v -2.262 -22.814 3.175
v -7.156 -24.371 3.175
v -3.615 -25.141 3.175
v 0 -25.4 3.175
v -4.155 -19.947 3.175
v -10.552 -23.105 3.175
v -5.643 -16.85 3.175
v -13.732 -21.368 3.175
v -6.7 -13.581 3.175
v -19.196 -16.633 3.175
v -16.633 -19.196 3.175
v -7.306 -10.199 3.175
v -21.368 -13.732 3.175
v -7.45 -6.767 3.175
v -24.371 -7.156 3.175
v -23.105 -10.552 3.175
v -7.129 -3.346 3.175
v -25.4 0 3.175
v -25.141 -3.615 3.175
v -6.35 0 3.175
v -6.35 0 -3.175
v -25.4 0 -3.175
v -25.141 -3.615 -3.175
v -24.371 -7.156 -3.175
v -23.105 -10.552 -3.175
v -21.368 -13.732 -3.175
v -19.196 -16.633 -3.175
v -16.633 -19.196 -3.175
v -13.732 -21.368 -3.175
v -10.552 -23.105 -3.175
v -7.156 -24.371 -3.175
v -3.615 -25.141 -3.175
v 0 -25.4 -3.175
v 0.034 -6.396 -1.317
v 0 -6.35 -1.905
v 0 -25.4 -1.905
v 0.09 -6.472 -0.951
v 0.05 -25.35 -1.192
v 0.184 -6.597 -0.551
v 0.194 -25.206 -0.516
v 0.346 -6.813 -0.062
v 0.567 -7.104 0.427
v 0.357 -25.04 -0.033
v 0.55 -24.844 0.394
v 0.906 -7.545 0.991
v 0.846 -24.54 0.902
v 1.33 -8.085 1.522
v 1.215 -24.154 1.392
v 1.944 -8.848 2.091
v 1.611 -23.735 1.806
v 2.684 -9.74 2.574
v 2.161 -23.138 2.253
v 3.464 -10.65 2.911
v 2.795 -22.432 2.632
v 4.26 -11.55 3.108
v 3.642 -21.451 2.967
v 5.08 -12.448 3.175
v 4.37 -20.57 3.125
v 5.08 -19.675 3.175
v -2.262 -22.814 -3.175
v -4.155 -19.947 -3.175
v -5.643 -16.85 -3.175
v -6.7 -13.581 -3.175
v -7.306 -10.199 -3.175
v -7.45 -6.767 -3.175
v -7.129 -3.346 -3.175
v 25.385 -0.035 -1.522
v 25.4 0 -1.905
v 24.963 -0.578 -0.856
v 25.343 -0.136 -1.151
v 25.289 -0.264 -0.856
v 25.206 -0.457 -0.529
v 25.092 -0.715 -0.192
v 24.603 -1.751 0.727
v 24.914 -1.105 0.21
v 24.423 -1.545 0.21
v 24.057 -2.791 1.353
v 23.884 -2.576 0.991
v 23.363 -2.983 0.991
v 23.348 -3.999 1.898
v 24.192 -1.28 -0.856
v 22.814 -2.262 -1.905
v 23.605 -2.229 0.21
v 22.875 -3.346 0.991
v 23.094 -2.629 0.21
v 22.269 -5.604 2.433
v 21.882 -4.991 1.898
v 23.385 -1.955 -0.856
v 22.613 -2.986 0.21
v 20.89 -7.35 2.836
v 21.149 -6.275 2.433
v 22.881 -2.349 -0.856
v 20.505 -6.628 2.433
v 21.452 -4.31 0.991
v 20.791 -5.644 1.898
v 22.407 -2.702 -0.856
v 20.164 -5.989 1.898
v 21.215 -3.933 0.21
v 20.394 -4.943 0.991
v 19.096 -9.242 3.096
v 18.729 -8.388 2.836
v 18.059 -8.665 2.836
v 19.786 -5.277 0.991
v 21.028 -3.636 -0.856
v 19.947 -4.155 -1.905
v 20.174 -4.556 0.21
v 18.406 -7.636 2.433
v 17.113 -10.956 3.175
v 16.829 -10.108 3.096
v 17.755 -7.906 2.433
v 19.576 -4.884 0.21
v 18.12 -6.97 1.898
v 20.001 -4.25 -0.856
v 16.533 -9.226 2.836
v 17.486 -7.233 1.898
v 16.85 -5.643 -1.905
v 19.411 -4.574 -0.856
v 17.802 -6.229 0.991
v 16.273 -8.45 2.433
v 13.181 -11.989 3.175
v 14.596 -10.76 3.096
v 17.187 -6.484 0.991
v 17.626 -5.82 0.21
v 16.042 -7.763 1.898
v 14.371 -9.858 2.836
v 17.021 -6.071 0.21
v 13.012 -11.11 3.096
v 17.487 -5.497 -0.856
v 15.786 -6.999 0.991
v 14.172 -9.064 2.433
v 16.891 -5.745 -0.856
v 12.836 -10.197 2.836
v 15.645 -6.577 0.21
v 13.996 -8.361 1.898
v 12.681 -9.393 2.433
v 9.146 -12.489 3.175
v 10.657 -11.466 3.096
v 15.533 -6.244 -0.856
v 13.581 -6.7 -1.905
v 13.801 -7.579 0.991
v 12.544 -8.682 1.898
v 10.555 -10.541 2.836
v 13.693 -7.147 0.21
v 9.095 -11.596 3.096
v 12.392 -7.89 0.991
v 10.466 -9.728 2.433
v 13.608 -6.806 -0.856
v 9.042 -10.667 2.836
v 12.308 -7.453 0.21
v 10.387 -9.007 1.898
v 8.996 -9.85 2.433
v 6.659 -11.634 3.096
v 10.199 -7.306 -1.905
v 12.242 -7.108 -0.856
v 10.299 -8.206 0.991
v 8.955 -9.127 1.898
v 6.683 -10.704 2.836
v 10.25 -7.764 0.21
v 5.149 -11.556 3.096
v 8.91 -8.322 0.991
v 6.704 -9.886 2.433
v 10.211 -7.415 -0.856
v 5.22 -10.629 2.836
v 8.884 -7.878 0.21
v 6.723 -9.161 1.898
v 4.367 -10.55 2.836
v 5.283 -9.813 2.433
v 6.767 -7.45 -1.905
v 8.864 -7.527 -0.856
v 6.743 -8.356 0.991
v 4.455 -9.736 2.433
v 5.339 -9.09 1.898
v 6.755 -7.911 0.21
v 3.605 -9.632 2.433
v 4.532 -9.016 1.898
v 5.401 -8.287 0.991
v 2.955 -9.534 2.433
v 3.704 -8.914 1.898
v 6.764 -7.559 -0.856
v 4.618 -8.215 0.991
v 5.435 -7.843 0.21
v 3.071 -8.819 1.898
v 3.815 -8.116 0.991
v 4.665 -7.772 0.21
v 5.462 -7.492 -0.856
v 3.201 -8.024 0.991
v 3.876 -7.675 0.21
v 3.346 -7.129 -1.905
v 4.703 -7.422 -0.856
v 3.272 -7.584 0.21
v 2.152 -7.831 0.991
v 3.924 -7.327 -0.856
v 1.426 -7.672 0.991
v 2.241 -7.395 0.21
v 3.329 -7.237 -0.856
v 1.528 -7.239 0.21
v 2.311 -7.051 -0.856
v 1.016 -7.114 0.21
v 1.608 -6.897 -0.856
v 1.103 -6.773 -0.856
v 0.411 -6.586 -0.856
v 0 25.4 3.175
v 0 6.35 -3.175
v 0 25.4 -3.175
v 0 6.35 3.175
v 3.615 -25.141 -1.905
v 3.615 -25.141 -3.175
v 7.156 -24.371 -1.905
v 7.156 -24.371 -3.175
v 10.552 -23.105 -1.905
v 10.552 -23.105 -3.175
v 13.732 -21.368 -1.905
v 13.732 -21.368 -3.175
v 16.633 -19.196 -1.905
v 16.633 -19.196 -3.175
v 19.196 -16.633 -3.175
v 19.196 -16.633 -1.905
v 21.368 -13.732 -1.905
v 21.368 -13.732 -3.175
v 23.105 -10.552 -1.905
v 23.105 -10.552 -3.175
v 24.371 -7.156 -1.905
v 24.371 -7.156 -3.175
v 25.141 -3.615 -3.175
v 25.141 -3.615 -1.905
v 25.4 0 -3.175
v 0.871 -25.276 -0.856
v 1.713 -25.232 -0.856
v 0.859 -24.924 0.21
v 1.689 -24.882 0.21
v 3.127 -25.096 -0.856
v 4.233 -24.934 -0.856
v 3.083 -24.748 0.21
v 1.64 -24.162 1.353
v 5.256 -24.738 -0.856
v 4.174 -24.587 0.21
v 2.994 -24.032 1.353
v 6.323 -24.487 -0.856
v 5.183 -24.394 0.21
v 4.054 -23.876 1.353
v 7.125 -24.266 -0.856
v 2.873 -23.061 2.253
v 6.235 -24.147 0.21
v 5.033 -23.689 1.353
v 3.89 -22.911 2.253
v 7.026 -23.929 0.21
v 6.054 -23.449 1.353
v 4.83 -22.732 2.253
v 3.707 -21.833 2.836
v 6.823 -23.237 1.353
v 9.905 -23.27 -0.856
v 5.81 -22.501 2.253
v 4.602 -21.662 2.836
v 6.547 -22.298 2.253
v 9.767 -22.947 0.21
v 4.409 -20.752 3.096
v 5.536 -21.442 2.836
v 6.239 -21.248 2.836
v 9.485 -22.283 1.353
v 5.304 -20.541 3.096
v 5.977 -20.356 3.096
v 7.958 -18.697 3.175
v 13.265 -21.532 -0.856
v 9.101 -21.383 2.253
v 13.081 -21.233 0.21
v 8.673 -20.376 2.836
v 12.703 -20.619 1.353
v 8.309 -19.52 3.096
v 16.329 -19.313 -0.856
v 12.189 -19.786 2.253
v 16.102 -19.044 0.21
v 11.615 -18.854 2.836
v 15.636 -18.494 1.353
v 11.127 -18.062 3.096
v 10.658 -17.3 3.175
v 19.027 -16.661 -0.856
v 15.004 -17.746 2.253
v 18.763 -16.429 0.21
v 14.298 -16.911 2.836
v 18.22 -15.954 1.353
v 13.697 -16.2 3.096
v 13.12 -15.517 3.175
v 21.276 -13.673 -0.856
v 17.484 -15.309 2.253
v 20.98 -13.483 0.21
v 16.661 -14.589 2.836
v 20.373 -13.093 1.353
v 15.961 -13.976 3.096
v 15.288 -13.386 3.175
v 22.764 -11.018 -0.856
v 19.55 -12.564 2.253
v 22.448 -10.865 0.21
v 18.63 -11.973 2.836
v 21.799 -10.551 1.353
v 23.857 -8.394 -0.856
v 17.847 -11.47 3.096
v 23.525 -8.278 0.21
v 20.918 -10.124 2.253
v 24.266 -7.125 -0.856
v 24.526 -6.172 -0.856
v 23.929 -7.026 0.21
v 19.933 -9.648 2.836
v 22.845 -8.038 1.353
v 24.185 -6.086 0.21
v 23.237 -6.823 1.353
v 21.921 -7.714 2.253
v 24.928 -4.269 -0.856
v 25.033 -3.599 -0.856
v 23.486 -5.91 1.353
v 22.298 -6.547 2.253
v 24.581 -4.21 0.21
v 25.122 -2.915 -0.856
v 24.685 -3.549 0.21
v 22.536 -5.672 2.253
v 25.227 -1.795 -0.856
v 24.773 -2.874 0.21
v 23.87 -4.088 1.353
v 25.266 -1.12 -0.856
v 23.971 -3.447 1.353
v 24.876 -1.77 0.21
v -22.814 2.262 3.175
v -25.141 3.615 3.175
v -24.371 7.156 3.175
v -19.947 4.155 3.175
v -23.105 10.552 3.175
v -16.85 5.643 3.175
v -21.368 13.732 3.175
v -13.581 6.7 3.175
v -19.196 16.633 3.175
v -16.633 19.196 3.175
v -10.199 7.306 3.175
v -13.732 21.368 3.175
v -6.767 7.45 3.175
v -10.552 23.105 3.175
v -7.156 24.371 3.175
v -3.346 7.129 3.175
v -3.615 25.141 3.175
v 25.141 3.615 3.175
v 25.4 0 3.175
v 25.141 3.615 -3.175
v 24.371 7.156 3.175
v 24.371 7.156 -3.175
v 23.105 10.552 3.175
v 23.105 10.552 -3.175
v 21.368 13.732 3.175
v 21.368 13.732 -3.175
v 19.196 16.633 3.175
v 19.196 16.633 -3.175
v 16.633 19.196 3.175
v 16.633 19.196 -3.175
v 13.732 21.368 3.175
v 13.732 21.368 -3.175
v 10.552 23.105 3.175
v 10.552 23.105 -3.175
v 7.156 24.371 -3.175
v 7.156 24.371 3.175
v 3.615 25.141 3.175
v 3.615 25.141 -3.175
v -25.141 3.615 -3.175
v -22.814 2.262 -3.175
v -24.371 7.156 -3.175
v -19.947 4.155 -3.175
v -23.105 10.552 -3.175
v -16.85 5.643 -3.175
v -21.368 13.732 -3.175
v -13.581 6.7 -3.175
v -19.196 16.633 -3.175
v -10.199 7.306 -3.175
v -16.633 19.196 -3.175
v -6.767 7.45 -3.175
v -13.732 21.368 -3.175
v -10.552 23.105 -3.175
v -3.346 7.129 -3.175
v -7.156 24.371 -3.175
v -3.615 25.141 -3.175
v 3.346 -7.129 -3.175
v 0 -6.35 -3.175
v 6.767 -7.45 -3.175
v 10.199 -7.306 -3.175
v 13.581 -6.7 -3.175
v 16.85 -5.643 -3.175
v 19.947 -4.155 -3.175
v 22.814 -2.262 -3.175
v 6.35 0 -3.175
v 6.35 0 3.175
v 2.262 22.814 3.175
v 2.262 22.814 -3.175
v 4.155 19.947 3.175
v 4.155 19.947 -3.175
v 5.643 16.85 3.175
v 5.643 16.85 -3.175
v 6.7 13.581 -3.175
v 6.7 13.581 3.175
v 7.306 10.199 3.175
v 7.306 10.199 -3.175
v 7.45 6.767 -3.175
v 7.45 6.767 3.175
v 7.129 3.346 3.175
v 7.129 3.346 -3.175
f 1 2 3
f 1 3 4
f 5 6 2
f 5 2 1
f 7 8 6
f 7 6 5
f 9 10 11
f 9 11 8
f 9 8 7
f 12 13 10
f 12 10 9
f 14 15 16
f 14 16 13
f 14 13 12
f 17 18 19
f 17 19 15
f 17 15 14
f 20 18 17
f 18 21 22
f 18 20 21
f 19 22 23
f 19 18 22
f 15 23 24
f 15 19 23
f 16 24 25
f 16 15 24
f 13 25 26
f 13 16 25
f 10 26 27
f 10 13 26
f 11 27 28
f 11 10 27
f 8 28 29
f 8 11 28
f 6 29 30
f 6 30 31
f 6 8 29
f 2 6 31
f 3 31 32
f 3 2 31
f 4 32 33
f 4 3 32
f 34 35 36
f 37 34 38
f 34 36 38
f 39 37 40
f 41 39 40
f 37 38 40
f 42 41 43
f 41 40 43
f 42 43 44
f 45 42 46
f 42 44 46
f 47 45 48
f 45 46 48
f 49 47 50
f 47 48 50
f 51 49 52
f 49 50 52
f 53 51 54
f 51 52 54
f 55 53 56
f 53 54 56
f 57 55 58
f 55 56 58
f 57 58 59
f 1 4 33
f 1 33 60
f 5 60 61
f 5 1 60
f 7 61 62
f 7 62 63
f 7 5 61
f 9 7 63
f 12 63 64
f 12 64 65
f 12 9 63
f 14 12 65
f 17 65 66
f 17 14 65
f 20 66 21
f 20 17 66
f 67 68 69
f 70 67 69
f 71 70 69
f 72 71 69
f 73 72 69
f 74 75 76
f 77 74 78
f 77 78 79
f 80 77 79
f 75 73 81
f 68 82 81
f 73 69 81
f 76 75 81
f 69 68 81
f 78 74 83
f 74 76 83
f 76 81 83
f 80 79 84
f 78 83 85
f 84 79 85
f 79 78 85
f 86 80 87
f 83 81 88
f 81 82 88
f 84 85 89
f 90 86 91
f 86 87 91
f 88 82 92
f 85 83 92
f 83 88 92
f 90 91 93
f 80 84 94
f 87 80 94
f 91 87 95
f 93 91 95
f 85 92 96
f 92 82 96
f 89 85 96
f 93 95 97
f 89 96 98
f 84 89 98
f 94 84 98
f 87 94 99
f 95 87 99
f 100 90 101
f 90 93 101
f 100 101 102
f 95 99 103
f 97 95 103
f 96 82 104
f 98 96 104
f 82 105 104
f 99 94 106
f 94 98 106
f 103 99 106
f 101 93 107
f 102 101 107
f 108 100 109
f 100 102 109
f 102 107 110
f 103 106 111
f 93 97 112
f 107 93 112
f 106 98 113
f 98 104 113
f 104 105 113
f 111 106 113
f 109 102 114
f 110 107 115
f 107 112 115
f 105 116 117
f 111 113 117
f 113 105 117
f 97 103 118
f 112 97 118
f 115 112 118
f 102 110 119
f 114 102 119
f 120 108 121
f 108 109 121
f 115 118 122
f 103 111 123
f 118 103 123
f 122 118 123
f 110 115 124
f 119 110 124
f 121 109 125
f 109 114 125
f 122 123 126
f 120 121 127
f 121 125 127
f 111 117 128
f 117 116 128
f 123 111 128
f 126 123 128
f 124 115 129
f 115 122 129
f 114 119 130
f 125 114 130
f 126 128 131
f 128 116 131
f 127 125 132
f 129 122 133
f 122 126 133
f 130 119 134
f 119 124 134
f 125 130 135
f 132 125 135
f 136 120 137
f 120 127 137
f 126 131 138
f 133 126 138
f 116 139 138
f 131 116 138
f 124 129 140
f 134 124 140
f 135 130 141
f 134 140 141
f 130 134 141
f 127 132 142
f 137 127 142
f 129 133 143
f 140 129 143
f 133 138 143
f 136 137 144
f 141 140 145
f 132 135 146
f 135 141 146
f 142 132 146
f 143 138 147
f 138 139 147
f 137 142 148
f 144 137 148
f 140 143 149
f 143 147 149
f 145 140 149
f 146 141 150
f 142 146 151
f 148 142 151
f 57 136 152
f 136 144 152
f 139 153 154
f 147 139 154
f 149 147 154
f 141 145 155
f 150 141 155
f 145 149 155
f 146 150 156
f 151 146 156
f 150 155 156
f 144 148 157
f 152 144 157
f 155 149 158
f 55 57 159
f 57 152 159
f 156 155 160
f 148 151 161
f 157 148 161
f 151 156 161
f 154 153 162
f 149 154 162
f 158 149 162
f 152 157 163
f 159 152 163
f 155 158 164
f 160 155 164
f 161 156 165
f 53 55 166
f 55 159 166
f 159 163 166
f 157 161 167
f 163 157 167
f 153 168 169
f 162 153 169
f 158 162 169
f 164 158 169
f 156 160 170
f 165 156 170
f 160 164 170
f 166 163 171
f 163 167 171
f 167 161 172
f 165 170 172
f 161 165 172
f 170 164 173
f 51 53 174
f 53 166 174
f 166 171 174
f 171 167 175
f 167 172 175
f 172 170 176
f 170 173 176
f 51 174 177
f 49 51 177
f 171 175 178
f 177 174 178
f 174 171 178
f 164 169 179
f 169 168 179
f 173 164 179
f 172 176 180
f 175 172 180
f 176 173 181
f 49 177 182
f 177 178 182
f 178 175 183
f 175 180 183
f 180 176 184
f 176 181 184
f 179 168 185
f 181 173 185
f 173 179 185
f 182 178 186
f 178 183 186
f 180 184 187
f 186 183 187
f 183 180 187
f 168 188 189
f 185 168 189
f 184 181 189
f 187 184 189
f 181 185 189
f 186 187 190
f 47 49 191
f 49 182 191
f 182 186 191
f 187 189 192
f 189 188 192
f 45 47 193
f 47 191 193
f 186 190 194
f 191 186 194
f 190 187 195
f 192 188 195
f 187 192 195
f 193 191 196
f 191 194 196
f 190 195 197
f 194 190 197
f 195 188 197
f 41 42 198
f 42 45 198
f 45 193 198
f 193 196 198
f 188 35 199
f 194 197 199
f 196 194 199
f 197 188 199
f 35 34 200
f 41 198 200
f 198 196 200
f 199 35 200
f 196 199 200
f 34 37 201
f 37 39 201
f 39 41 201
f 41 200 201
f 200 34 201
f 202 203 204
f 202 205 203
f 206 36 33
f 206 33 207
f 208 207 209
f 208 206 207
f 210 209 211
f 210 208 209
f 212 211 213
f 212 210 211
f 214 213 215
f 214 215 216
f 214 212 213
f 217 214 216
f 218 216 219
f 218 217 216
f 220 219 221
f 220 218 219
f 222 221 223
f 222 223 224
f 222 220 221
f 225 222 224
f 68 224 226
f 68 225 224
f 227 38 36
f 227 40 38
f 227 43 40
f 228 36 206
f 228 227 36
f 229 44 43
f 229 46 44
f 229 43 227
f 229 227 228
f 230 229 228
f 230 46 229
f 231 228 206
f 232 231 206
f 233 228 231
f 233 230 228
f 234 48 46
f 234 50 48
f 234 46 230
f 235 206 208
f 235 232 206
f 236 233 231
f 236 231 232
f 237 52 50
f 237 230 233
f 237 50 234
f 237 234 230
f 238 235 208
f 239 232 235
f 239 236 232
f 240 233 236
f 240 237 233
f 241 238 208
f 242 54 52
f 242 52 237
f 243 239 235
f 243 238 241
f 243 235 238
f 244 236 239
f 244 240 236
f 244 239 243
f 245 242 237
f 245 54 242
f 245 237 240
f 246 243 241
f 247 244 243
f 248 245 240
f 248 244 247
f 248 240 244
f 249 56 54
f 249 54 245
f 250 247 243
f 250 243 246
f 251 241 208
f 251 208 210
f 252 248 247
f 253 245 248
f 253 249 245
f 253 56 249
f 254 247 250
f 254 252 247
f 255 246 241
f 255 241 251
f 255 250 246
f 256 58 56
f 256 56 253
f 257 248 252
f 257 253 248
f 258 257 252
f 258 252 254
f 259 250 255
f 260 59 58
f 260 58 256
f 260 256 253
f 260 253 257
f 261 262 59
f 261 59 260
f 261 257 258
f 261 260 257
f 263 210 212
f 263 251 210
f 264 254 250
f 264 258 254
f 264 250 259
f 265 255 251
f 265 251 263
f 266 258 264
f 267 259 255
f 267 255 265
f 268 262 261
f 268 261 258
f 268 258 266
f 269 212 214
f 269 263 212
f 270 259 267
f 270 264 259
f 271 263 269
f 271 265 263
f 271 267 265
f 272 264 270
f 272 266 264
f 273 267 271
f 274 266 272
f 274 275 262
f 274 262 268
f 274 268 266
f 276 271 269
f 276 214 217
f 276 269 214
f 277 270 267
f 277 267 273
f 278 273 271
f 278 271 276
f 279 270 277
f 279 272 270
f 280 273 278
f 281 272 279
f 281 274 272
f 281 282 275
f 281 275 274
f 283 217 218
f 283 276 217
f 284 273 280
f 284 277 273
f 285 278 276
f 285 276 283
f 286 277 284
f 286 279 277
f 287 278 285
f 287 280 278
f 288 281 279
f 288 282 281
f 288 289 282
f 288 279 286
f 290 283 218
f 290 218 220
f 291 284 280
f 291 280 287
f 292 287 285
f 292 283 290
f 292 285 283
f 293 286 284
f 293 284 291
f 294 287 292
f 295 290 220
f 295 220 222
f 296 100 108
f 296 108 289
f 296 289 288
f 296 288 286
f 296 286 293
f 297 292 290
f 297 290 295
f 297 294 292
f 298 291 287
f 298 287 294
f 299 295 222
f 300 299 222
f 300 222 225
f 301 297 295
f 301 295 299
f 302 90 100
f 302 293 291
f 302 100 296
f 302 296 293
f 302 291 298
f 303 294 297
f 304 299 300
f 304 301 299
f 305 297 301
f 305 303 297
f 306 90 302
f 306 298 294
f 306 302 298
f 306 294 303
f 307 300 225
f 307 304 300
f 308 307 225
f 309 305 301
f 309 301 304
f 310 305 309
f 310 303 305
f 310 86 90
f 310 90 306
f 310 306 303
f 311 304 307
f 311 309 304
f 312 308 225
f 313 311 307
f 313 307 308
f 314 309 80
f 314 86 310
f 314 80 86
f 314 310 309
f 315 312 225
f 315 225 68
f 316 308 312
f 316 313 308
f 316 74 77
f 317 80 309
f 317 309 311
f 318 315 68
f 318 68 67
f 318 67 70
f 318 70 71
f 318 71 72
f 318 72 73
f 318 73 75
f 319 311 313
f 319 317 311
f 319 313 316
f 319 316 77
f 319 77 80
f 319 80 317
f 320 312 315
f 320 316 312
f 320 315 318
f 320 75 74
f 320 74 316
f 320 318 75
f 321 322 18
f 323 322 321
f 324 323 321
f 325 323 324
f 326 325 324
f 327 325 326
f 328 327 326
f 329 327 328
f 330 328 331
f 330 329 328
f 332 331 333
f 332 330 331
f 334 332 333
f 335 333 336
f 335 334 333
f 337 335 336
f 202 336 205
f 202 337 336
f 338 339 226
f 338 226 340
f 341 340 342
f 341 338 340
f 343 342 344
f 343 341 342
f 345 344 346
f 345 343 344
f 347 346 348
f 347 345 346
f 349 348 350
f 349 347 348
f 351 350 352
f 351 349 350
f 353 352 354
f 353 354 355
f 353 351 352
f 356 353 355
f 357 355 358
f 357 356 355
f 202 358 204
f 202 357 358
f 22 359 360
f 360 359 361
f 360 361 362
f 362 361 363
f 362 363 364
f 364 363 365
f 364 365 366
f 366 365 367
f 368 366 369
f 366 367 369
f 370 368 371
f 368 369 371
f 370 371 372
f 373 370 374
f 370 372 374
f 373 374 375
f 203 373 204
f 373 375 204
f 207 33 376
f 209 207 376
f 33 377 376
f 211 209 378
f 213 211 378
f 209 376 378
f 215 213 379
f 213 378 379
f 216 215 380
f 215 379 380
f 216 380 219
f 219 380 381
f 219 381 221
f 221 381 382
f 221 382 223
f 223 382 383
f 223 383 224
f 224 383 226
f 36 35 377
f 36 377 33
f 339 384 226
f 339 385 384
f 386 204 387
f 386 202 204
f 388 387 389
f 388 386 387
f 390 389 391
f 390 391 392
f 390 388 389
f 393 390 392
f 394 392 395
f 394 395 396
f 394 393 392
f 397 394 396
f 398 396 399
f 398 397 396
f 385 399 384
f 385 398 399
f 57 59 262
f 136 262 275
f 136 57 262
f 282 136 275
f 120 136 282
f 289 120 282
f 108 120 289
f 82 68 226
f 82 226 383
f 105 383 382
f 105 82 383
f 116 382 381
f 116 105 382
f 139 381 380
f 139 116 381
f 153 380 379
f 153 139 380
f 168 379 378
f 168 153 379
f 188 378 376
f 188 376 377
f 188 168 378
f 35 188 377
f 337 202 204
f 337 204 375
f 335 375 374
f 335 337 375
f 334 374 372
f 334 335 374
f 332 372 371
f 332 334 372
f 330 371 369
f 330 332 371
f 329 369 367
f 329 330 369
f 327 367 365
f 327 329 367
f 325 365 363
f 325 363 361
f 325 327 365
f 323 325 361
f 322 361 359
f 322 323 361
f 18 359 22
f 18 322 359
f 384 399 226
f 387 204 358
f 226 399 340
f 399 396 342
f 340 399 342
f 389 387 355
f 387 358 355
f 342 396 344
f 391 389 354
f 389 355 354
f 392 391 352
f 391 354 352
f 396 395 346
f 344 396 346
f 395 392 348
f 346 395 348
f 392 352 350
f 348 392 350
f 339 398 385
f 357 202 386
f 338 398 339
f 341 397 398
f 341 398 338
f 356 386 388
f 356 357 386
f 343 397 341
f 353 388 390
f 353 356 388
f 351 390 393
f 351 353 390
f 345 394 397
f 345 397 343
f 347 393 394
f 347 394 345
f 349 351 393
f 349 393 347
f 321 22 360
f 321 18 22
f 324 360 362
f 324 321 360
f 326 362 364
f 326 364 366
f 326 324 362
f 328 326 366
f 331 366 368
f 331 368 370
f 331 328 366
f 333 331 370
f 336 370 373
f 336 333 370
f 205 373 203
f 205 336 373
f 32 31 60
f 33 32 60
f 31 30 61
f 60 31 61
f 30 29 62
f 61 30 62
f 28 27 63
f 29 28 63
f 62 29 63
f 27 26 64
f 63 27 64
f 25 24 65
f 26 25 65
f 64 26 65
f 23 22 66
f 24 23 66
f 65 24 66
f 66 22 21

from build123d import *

# Parameters (mm, degrees)
F1_DEPTH = 3.175
F2_R     = 5.08


with BuildPart() as f1:
    # F0 (on Top) → F1 (new body, symmetric)
    with BuildSketch(Plane.XY):
        with BuildLine():
            Line((6.35, 0), (25.4, 0))
            ThreePointArc((25.4, 0), (17.9605122421, 17.9605122421), (0, 25.4))
            ThreePointArc((0, 25.4), (6.6998154897, 13.5812038724), (6.35, 0))
        make_face()
    extrude(amount=F1_DEPTH, both=True)


with BuildPart() as f1b:
    # F0 (on Top) → F1, piece 2 (new body, symmetric)
    with BuildSketch(Plane.XY):
        with BuildLine():
            Line((0, 6.35), (0, 25.4))
            ThreePointArc((0, 25.4), (-17.9605122421, 17.9605122421), (-25.4, 0))
            ThreePointArc((-25.4, 0), (-13.5812038724, 6.6998154897), (0, 6.35))
        make_face()
    extrude(amount=F1_DEPTH, both=True)


with BuildPart() as f1c:
    # F0 (on Top) → F1, piece 3 (new body, symmetric)
    with BuildSketch(Plane.XY):
        with BuildLine():
            ThreePointArc((-25.4, 0), (-17.9605122421, -17.9605122421), (0, -25.4))
            ThreePointArc((0, -25.4), (-6.6998154897, -13.5812038724), (-6.35, 0))
            Line((-6.35, 0), (-25.4, 0))
        make_face()
    extrude(amount=F1_DEPTH, both=True)


with BuildPart() as f1d:
    # F0 (on Top) → F1, piece 4 (new body, symmetric)
    with BuildSketch(Plane.XY):
        with BuildLine():
            ThreePointArc((0, -25.4), (17.9605122421, -17.9605122421), (25.4, 0))
            ThreePointArc((25.4, 0), (13.5812038724, -6.6998154897), (0, -6.35))
            Line((0, -6.35), (0, -25.4))
        make_face()
    extrude(amount=F1_DEPTH, both=True)

    # F2
    f2_edges = [f1d.edges().sort_by_distance(p)[0] for p in [
        (0, -15.875, 3.175),
        (17.960512, -17.960512, 3.175),
        (13.581204, -6.699815, 3.175),
    ]]
    fillet(f2_edges, radius=F2_R)


solid = Compound([f1.part, f1b.part, f1c.part, f1d.part])
